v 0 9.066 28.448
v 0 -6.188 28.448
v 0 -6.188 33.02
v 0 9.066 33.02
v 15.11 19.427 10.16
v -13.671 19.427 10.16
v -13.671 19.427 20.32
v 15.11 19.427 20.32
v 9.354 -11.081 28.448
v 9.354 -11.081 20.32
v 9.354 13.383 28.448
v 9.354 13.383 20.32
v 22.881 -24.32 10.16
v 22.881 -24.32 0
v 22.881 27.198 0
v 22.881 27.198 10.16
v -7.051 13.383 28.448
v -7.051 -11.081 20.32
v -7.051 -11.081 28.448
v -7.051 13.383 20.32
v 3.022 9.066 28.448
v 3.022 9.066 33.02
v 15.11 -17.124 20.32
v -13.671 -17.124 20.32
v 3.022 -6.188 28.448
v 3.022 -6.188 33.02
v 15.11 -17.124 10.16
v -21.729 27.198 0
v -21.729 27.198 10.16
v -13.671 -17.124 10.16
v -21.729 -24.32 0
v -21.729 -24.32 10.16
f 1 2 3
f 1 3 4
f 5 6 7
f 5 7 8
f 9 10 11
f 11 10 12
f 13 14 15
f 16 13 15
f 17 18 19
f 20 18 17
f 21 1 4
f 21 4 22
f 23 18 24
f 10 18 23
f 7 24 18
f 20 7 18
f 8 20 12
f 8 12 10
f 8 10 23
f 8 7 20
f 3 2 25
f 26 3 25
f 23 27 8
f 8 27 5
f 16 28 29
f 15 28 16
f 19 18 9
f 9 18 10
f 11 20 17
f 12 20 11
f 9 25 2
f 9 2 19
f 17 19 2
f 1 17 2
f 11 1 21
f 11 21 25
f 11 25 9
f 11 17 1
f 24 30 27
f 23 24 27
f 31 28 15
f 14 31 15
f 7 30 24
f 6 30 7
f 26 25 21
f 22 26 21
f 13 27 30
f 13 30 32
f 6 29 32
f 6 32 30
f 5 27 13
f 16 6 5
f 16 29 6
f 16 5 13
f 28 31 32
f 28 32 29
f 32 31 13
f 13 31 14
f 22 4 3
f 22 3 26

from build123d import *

# Parameters (mm, degrees)
F0_W     = 44.609893
F0_H     = 51.517231
F1_DEPTH = 10.16
F2_W     = 28.780576
F2_H     = 36.55133
F3_DEPTH = 20.32
F4_W     = 16.404928
F4_H     = 24.463489
F5_DEPTH = 28.448
F6_W     = 3.02196
F6_H     = 15.253705
F7_DEPTH = 33.02


with BuildPart() as f1:
    # F0 (on Top) → F1 (new body)
    with BuildSketch(Plane.XY):
        with Locations((0.575612, 1.439029)):
            Rectangle(F0_W, F0_H)
    extrude(amount=F1_DEPTH)

    # F2 (on Top) → F3 (join)
    with BuildSketch(Plane.XY):
        with Locations((0.719515, 1.151223)):
            Rectangle(F2_W, F2_H)
    extrude(amount=F3_DEPTH)

    # F4 (on Top) → F5 (join)
    with BuildSketch(Plane.XY):
        with Locations((1.151223, 1.151224)):
            Rectangle(F4_W, F4_H)
    extrude(amount=F5_DEPTH)

    # F6 (on Top) → F7 (join)
    with BuildSketch(Plane.XY):
        with Locations((1.51098, 1.439028)):
            Rectangle(F6_W, F6_H)
    extrude(amount=F7_DEPTH)


solid = f1.part
